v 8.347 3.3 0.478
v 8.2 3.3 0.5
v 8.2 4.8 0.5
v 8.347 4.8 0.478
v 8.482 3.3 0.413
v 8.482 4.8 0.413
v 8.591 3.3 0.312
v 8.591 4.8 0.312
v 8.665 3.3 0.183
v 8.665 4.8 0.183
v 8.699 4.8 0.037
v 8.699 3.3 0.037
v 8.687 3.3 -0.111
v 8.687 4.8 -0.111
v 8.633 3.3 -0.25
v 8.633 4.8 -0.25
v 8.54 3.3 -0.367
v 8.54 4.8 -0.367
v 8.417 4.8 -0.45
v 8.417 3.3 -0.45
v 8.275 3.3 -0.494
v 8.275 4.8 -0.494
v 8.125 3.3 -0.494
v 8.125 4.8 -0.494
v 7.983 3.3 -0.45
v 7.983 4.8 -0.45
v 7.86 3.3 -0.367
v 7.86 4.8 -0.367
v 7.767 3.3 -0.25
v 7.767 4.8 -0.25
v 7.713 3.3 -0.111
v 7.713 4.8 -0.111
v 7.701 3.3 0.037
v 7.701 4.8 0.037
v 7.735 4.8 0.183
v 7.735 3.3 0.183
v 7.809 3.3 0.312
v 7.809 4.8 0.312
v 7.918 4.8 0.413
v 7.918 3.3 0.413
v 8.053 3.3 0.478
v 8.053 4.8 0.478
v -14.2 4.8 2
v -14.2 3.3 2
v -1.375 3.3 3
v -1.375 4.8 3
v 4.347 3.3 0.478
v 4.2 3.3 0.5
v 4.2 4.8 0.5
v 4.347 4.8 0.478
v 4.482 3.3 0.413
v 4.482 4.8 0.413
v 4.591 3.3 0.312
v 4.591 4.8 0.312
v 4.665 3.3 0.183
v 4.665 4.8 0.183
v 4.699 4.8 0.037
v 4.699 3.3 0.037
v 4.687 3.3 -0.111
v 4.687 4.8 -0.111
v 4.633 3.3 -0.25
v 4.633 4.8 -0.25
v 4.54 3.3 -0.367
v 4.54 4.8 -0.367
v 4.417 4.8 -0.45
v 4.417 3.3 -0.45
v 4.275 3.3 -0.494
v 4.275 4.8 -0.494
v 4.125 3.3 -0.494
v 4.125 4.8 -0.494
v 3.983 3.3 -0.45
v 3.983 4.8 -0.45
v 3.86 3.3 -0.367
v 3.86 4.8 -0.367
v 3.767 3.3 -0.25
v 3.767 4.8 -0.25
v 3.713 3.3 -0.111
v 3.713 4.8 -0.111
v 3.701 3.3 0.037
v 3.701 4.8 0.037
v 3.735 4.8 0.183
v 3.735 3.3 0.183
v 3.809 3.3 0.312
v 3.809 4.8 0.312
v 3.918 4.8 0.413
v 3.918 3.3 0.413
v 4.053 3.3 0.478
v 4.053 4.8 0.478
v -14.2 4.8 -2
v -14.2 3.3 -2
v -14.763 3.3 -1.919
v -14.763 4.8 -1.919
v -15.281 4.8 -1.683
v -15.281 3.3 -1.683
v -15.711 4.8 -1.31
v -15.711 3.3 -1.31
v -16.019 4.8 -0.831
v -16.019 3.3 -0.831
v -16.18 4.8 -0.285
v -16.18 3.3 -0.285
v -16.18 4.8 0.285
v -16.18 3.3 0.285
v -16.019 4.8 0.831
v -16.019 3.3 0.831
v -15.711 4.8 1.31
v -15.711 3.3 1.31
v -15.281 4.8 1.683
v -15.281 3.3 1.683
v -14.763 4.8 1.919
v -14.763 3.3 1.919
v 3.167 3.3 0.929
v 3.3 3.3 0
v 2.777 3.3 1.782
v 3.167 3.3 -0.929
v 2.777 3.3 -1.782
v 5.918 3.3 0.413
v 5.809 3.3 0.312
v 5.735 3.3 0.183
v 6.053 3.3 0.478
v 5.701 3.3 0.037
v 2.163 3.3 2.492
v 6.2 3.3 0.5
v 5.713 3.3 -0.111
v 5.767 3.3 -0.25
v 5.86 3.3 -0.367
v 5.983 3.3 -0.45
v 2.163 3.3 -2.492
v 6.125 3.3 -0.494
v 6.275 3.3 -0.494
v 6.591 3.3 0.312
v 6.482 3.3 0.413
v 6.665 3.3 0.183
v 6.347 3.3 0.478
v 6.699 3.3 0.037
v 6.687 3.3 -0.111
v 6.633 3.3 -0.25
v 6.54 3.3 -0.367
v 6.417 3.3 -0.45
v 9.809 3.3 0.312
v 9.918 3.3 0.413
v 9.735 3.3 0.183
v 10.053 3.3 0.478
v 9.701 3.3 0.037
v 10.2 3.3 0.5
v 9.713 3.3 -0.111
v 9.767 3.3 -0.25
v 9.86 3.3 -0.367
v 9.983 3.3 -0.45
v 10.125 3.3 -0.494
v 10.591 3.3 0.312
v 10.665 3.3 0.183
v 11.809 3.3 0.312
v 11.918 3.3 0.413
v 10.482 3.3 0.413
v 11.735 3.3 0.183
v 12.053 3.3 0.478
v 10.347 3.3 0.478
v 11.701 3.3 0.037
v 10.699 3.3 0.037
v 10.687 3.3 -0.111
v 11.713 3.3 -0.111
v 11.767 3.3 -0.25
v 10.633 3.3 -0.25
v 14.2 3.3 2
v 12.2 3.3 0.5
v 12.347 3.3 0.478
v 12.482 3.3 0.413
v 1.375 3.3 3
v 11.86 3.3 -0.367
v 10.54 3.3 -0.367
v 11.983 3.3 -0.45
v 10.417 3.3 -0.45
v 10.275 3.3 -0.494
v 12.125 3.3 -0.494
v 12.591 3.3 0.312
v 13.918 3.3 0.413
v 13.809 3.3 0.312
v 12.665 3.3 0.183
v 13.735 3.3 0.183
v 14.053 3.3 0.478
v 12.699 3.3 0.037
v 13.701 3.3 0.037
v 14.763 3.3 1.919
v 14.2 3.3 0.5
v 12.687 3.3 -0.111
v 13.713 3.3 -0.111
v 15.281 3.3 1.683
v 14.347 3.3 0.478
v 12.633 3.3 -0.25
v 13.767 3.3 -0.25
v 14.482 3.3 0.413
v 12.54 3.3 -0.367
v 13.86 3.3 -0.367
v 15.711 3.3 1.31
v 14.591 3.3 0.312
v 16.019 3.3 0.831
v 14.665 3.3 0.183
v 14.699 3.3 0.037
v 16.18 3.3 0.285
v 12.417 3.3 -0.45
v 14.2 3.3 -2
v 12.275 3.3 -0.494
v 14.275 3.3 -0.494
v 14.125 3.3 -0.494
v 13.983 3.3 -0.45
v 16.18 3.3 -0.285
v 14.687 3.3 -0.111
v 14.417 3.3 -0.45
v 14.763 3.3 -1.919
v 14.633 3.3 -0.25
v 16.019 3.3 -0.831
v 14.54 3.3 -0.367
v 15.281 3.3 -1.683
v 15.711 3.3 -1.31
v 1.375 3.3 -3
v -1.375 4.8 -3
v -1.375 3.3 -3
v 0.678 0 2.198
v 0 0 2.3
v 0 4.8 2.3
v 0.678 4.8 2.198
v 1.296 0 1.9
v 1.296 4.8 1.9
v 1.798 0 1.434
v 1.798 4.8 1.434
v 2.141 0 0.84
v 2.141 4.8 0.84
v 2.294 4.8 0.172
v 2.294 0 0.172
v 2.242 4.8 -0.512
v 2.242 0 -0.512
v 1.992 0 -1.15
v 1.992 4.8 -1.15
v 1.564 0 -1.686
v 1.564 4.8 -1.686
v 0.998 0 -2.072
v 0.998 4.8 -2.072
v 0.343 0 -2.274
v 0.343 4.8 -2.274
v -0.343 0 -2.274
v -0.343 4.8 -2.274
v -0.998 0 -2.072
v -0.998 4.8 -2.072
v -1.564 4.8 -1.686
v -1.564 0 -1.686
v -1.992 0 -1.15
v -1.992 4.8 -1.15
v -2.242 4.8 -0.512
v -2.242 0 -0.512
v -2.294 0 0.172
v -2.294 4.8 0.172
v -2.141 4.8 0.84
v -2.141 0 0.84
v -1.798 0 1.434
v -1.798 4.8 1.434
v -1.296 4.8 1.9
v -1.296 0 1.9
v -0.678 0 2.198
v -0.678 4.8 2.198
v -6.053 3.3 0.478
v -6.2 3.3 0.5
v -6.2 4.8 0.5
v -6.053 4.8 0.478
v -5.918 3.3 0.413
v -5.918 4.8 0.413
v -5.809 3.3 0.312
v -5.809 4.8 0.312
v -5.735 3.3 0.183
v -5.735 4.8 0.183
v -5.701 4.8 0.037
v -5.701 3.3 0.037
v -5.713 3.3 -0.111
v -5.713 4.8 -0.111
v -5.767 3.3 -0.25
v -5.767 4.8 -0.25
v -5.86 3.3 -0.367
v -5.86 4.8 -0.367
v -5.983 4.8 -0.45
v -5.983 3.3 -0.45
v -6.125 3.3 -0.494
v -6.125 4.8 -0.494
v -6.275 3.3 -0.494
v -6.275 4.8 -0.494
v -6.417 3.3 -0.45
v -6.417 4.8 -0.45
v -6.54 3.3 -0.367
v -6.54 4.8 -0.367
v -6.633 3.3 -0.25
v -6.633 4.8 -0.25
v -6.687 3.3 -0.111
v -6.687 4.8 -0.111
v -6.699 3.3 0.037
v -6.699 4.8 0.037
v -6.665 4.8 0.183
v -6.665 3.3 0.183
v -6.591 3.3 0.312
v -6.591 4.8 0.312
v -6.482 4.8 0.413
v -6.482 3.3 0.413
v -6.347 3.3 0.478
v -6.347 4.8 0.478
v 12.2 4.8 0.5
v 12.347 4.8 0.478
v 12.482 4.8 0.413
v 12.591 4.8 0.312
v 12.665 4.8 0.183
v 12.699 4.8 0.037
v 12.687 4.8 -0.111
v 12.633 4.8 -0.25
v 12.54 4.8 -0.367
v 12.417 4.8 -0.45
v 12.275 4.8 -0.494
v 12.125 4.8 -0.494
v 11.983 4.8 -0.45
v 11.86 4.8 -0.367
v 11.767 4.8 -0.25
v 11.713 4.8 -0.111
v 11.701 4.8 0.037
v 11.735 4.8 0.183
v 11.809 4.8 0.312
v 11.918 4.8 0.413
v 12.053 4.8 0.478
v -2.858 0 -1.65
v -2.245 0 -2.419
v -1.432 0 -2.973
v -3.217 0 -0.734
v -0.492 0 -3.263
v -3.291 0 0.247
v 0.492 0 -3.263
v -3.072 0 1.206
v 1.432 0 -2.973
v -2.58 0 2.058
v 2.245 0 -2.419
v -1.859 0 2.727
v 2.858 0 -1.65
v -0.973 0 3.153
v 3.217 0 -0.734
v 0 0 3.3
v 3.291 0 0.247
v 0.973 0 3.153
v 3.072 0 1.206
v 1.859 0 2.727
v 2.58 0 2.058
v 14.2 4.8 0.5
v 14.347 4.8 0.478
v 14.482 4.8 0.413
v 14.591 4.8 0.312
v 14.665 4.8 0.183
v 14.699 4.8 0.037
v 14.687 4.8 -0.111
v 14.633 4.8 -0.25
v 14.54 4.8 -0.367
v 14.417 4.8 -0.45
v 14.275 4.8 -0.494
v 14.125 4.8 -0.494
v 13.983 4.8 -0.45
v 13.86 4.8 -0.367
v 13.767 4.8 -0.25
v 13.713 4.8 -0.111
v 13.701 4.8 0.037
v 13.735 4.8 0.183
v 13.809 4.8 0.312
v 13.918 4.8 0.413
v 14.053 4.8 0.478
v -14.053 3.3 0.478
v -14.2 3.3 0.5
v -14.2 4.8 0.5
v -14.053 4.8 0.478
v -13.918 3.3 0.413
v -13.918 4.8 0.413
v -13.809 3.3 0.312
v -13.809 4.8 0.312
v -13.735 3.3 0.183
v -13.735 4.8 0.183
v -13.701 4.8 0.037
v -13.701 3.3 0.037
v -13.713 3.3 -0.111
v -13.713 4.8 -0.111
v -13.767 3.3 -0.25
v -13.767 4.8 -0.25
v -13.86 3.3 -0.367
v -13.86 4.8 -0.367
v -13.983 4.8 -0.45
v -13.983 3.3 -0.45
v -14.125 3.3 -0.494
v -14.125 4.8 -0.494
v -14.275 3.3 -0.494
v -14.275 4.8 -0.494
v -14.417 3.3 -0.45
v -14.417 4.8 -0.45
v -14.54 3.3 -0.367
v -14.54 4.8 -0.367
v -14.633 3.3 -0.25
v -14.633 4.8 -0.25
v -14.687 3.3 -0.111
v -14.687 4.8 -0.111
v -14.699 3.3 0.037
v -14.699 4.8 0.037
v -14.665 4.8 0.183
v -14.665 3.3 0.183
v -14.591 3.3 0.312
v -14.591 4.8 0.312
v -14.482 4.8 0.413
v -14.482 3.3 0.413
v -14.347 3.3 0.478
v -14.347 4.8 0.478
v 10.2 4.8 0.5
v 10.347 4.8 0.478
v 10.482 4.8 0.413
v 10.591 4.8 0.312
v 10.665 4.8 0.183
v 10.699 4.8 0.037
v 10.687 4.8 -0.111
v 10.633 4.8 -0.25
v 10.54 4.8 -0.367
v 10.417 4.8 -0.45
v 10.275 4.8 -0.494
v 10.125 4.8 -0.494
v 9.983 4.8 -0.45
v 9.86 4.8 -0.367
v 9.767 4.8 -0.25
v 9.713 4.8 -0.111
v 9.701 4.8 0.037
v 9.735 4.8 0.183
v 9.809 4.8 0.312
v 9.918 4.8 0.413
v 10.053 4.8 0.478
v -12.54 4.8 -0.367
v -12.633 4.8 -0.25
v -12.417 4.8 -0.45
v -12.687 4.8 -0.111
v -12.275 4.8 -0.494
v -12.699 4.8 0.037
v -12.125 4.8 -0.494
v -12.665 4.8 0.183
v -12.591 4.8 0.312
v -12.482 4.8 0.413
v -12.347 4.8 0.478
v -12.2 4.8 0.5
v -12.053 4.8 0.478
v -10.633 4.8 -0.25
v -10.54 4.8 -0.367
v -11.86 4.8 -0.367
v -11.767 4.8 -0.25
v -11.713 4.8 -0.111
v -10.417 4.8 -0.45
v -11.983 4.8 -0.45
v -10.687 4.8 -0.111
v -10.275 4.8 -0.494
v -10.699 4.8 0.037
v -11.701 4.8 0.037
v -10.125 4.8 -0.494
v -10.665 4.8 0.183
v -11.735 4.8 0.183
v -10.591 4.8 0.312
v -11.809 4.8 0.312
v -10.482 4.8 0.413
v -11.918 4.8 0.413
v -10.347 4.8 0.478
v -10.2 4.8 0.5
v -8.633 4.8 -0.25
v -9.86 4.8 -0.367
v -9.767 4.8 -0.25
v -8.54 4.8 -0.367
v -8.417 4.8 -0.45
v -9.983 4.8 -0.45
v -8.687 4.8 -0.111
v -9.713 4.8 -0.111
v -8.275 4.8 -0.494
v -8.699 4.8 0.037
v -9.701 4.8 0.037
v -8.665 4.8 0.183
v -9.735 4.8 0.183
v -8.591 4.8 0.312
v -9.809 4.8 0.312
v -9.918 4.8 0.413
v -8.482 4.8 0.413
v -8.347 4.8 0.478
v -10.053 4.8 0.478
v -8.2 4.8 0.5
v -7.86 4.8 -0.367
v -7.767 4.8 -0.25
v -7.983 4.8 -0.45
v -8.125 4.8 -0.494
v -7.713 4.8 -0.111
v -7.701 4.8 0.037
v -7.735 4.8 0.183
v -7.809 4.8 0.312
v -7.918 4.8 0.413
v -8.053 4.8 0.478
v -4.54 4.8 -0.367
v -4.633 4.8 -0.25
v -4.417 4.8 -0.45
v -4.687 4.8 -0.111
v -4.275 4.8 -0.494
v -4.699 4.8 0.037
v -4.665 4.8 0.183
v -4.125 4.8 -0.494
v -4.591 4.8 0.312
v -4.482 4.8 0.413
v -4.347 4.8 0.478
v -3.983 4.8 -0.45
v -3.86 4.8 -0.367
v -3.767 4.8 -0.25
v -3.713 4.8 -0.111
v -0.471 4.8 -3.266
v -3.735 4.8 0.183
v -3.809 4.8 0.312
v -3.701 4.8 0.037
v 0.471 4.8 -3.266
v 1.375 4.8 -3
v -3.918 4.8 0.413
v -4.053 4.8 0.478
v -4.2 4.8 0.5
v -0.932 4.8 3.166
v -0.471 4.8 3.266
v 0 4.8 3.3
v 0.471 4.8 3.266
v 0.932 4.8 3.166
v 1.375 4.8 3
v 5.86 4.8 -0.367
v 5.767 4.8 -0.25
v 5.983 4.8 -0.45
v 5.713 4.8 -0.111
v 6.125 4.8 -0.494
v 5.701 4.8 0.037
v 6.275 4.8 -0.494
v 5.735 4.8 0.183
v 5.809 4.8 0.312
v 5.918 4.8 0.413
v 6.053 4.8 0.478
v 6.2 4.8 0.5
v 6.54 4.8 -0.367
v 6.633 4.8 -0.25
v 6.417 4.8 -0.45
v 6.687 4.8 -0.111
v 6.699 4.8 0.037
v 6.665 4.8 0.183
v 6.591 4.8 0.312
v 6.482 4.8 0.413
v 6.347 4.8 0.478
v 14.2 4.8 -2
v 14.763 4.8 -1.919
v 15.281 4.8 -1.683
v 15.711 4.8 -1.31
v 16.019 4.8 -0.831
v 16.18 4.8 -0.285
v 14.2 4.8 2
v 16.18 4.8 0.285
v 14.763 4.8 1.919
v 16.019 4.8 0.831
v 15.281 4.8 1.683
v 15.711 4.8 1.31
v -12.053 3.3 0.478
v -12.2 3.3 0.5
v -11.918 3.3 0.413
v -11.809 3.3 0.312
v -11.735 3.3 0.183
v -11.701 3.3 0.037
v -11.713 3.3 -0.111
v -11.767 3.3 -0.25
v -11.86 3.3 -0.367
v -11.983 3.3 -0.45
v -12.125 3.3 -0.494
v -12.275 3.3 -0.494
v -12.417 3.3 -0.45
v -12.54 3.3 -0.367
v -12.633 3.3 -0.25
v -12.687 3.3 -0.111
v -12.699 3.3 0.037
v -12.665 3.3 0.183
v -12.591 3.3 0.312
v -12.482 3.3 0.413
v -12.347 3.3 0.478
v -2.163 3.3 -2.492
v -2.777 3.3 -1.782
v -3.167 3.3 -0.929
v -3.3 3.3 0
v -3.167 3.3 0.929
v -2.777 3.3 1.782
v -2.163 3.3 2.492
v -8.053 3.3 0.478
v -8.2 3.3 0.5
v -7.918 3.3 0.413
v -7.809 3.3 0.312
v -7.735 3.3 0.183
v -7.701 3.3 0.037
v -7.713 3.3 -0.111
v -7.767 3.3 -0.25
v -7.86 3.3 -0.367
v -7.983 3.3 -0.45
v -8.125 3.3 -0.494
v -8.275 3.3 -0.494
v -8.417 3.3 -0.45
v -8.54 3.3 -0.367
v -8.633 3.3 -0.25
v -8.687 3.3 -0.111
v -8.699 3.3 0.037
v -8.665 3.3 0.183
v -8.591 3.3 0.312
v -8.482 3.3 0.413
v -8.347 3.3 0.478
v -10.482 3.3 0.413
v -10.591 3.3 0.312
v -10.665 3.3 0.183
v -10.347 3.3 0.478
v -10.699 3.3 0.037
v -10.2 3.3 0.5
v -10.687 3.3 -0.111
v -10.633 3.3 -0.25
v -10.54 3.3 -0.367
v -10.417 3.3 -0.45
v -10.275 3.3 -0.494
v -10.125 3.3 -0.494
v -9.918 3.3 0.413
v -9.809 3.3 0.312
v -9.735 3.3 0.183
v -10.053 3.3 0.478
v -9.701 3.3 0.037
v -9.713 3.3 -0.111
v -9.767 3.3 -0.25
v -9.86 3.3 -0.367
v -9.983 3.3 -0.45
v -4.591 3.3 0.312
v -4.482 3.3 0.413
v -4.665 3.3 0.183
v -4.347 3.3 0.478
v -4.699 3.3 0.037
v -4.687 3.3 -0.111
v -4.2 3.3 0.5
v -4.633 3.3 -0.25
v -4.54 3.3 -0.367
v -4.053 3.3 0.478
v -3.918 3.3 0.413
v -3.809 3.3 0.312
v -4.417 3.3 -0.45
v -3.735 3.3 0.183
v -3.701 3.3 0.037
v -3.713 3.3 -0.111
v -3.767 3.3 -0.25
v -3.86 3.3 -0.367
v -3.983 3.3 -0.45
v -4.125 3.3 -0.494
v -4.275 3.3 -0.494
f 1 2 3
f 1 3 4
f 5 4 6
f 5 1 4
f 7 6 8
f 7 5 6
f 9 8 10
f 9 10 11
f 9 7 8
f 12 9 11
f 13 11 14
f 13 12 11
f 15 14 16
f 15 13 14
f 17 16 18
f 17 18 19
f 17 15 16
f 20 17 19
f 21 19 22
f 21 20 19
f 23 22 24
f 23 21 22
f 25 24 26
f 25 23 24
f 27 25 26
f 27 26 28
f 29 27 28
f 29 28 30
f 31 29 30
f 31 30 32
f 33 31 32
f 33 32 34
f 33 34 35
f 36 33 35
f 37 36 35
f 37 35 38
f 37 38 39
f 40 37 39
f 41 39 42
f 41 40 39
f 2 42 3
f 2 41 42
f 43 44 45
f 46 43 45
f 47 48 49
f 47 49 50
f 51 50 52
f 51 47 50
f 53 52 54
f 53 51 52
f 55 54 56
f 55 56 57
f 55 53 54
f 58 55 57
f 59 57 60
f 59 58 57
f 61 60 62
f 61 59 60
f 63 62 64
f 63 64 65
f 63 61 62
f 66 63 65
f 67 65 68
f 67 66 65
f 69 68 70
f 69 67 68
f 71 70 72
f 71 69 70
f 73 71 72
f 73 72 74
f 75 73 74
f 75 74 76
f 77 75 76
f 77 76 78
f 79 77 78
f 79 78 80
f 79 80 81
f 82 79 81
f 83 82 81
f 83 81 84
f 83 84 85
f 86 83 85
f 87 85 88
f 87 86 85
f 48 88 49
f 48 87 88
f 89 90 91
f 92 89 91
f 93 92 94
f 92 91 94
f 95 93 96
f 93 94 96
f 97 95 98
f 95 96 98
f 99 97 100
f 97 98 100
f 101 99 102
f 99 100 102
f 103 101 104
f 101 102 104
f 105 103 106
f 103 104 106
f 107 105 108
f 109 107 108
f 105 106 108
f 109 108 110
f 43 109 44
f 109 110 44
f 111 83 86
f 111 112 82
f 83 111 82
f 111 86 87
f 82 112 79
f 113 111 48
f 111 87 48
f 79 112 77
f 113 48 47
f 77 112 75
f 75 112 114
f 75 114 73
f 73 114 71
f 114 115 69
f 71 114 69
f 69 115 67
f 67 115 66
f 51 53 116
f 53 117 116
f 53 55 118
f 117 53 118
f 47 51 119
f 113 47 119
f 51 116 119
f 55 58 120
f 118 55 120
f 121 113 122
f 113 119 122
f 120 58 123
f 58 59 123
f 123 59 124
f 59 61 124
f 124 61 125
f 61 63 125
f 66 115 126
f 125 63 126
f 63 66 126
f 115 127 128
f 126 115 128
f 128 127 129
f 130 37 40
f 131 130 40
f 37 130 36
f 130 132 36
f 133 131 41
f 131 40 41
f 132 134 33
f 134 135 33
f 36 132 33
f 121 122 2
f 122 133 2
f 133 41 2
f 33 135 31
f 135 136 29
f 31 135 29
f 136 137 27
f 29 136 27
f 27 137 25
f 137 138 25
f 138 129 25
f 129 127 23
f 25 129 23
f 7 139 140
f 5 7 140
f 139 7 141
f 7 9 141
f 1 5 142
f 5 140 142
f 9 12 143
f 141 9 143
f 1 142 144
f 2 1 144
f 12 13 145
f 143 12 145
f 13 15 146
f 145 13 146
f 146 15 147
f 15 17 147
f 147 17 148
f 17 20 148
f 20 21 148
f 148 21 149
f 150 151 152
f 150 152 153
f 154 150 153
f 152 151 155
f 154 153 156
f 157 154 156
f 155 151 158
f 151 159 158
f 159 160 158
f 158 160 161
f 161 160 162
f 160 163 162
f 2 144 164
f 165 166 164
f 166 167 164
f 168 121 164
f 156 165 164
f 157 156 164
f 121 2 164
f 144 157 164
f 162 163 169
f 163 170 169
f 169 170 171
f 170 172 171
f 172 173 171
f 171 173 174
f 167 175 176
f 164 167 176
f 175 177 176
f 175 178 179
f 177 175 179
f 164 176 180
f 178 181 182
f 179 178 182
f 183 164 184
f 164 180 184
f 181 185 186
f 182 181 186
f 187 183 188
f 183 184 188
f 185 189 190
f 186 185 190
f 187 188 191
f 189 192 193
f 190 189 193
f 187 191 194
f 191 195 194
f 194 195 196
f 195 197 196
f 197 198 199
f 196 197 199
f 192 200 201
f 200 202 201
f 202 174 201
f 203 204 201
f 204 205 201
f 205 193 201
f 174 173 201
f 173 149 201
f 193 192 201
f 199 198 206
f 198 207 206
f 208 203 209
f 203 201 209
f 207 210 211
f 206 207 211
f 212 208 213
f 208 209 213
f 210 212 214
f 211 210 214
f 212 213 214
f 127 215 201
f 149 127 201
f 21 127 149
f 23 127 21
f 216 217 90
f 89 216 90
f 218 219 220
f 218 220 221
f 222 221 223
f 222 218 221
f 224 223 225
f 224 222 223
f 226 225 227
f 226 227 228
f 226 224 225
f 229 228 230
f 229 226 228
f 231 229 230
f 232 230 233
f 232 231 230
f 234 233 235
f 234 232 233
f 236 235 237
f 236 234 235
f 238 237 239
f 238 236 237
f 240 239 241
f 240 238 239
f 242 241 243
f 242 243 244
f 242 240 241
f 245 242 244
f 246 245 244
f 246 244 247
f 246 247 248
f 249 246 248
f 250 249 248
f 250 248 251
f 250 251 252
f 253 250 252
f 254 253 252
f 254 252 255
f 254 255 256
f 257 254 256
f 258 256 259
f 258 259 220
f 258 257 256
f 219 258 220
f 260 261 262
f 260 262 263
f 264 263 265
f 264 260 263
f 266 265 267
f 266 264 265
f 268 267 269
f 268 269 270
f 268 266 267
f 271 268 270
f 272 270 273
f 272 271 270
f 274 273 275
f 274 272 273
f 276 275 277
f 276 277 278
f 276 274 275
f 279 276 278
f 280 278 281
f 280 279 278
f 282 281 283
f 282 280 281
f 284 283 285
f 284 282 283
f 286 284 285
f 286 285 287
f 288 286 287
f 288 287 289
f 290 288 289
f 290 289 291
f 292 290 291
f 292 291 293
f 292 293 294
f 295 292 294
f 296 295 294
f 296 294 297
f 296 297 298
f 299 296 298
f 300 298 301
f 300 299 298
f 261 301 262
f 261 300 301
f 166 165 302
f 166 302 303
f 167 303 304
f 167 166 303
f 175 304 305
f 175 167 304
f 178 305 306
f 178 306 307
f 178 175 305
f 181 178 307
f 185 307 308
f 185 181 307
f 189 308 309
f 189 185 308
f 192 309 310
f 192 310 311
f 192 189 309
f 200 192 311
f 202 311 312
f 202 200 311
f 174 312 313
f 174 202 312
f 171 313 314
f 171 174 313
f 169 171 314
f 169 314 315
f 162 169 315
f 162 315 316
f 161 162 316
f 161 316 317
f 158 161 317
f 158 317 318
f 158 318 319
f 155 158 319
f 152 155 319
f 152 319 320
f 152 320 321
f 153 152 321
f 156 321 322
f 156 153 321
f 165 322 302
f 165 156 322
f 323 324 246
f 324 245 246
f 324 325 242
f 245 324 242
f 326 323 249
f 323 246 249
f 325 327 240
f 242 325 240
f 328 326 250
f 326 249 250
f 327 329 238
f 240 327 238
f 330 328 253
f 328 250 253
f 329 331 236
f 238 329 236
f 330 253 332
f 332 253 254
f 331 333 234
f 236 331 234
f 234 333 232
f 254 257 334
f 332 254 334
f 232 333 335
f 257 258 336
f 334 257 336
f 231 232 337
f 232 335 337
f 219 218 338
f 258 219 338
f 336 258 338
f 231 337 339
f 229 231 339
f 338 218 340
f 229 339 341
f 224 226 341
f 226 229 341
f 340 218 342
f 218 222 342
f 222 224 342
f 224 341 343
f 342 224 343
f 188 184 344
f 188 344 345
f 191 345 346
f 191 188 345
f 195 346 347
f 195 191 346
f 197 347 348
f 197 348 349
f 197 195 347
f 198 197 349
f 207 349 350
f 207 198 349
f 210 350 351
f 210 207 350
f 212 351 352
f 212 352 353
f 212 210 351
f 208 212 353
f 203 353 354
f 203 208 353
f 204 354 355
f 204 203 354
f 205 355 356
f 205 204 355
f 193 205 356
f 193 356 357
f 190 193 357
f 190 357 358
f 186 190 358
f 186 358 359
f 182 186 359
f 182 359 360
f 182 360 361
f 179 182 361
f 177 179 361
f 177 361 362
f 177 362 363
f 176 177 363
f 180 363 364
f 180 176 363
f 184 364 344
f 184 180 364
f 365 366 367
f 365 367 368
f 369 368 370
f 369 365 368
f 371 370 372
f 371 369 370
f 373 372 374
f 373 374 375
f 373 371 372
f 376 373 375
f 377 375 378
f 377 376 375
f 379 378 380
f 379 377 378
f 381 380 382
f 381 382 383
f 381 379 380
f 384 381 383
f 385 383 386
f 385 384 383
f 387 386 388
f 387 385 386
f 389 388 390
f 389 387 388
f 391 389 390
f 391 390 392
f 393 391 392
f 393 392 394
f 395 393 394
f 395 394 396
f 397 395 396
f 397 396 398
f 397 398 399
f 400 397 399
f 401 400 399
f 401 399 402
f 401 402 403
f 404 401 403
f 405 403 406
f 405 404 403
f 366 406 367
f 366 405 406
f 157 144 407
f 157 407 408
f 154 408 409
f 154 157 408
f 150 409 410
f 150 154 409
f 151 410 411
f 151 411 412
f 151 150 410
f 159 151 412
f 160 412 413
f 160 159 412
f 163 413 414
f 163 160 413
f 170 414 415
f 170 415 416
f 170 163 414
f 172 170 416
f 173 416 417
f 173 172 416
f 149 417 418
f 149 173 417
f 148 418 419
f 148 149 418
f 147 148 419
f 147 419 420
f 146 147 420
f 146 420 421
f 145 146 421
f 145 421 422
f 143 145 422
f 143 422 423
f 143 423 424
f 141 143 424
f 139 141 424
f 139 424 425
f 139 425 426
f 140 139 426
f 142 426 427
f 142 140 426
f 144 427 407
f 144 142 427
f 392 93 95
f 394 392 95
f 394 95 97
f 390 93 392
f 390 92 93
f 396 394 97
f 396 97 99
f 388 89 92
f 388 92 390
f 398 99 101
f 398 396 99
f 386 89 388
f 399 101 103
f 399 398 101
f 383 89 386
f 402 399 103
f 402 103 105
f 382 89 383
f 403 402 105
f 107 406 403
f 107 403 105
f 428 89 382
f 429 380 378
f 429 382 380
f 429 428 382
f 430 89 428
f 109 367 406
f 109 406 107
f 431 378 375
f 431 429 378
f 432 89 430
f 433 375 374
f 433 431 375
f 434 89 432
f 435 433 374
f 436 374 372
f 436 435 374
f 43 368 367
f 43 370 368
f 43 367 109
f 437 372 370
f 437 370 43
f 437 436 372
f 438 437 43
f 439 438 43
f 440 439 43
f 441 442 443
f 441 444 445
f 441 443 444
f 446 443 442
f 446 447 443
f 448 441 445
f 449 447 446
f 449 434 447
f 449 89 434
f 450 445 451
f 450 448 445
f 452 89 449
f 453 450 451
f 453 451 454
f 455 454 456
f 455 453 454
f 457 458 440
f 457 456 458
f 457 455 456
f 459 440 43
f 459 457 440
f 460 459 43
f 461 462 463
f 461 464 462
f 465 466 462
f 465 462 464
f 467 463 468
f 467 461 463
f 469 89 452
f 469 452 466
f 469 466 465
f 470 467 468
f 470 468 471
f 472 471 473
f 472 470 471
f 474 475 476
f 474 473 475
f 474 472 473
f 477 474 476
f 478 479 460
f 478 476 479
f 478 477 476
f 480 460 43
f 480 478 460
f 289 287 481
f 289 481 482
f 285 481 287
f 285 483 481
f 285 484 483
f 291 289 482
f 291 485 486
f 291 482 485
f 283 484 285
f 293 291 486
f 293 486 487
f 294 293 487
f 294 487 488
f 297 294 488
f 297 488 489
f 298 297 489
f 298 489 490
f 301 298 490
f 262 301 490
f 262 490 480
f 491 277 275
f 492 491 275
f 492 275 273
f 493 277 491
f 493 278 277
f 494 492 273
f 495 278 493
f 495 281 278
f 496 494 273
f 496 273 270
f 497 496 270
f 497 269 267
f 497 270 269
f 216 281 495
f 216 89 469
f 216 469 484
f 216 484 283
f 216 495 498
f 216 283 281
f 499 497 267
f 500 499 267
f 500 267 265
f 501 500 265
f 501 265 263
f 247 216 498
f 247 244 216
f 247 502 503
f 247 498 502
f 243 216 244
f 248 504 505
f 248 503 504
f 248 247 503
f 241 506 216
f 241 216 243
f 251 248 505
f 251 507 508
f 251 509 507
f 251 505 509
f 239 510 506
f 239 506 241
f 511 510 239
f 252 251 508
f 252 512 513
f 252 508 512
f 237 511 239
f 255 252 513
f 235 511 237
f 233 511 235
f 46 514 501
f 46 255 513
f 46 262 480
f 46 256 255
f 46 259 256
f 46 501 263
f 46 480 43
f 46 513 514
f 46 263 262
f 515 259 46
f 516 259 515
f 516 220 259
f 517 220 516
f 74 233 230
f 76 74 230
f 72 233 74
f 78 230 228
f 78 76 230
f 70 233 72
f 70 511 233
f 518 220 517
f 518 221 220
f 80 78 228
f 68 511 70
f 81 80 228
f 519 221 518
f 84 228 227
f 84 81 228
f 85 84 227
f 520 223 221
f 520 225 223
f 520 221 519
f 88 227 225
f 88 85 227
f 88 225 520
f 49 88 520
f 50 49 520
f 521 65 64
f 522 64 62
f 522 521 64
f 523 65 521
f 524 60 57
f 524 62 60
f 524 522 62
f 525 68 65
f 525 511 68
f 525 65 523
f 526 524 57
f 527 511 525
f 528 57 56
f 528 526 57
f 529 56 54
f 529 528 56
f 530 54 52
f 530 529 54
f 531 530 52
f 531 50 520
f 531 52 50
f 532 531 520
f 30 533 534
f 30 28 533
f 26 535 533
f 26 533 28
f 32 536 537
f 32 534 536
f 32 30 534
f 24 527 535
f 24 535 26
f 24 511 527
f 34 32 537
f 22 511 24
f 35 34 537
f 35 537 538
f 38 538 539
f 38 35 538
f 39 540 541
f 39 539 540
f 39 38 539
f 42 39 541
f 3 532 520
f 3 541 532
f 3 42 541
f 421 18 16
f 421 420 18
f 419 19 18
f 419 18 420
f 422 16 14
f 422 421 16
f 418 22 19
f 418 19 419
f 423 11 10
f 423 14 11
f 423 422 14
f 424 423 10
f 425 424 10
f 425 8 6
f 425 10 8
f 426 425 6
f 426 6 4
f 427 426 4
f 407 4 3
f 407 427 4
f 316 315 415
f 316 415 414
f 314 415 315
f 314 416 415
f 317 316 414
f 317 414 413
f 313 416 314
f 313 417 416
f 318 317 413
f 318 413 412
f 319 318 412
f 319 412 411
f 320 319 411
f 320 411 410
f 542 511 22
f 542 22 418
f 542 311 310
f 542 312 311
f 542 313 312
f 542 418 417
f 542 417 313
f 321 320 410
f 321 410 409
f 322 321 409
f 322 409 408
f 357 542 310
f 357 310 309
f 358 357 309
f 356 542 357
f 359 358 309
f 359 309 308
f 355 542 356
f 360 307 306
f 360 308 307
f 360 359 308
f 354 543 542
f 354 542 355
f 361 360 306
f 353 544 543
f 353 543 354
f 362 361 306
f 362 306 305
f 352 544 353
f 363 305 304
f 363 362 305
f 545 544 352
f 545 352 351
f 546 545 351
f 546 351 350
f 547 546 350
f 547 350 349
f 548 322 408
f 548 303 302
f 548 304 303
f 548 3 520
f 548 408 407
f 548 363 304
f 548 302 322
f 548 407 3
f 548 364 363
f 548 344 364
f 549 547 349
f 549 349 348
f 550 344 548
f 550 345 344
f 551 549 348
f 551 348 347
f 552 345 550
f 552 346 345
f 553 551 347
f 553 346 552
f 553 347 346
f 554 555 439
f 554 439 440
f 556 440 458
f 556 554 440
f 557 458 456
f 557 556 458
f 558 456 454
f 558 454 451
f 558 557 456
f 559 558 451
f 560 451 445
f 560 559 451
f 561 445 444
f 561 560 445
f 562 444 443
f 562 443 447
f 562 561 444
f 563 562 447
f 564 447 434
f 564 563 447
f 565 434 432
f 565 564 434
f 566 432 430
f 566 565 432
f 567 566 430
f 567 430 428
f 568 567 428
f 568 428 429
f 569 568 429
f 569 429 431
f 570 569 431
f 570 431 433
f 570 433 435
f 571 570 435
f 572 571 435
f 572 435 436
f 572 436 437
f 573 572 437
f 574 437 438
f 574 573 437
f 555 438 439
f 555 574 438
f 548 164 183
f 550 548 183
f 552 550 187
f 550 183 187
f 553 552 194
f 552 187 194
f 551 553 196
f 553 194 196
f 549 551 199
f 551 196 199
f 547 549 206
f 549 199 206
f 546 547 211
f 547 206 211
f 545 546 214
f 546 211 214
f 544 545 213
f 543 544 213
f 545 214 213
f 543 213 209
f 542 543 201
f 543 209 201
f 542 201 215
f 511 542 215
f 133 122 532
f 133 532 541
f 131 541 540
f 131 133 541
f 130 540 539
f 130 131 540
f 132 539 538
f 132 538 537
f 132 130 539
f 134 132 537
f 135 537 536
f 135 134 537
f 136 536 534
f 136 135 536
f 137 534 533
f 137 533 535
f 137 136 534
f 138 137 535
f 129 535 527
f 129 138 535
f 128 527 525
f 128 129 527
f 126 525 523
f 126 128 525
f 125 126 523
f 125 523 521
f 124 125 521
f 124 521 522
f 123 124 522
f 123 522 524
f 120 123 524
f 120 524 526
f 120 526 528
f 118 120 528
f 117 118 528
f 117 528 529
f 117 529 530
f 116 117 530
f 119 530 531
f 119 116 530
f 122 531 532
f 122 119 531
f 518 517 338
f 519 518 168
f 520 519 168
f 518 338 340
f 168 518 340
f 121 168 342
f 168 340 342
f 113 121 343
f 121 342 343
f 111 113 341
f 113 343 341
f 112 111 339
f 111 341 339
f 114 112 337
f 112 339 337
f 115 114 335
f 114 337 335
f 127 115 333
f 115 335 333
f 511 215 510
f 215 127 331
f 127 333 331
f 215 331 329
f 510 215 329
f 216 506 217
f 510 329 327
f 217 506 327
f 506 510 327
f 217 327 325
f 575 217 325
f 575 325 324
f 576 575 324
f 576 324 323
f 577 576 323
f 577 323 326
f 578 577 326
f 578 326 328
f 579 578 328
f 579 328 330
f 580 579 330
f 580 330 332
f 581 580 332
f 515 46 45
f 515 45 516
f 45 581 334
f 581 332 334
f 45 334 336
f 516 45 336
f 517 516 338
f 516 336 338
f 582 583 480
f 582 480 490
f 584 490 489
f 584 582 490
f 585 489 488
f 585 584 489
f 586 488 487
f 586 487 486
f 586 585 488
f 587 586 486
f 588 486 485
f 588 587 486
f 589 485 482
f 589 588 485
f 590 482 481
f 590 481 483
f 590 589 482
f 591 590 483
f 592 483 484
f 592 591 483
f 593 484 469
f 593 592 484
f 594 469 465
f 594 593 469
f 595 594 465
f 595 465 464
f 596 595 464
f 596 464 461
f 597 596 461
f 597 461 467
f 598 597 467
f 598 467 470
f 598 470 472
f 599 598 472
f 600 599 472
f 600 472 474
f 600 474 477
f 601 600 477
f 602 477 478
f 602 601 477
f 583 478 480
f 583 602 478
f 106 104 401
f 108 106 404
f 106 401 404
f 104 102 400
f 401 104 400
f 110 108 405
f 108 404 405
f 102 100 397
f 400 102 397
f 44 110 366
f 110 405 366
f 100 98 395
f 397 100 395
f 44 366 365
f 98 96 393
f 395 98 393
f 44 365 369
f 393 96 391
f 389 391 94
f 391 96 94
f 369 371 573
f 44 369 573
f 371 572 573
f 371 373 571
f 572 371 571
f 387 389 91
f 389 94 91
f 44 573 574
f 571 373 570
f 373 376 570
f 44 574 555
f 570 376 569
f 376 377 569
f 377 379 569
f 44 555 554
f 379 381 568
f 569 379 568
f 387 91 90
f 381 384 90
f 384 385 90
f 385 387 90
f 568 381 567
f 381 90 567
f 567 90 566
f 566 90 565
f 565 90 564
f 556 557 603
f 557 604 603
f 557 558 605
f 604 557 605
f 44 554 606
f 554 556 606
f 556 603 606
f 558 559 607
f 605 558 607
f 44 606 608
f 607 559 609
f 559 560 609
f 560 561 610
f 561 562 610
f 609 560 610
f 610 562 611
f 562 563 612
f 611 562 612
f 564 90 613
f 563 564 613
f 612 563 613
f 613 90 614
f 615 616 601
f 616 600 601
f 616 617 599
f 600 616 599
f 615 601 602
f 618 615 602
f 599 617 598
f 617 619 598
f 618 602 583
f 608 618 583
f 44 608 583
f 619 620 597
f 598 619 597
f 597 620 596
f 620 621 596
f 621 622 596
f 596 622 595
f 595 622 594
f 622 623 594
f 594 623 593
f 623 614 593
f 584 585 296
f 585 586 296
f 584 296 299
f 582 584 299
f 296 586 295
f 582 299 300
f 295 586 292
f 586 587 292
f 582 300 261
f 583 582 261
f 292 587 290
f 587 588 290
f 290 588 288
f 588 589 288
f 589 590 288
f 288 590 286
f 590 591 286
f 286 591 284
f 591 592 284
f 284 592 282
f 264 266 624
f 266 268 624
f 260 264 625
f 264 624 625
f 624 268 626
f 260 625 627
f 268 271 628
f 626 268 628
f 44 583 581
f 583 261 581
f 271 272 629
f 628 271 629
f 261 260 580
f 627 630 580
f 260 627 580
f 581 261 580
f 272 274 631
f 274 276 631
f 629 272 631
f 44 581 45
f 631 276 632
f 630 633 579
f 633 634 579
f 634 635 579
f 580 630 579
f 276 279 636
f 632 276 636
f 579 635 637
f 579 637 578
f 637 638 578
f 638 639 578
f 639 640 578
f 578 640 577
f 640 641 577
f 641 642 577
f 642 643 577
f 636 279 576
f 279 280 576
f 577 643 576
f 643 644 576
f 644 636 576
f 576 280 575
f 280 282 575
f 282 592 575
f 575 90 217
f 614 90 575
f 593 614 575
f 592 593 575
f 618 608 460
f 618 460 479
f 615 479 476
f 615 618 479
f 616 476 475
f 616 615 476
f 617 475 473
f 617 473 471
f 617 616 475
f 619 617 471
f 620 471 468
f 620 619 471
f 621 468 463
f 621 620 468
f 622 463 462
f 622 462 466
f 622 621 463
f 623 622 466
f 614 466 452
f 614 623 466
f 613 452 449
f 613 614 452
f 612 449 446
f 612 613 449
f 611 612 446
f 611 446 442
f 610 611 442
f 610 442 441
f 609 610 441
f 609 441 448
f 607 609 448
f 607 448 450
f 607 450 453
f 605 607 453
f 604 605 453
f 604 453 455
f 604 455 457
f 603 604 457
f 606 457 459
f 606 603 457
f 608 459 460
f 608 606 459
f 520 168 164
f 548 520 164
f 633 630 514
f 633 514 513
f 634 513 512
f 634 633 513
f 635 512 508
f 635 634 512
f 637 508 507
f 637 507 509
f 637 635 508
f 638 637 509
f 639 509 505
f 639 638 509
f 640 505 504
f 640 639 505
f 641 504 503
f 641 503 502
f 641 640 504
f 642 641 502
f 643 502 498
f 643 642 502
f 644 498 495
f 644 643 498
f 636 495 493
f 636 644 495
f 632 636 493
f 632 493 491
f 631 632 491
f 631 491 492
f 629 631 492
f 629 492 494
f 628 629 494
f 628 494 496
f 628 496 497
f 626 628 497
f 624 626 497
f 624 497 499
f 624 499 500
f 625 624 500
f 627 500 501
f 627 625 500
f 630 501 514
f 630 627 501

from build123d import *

# Parameters (mm, degrees)
ESBO_O2_R                = 3.3
ESBO_O2_R_2              = 2.3
RESSALTO_EXTRUS_O1_DEPTH = 4.8
RESSALTO_EXTRUS_O2_START = -1.5
ESBO_O3_R                = 0.5
RESSALTO_EXTRUS_O2_DEPTH = 1.5


with BuildPart() as part:
    # Esboço2 → Ressalto-extrusão1 (new body)
    with BuildSketch(Plane(origin=(0, 0, 0), x_dir=(1, 0, 0), z_dir=(0, 1, 0))):
        with Locations(Location((0, 0, 0), (0, 0, 270))):
            Circle(ESBO_O2_R)
        with Locations(Location((0, 0, 0), (0, 0, 270))):
            Circle(ESBO_O2_R_2, mode=Mode.SUBTRACT)
    extrude(amount=RESSALTO_EXTRUS_O1_DEPTH)

    # Esboço3 → Ressalto-extrusão2 (add)
    # profile 1 of 2: a face of its own
    with BuildSketch(Plane(origin=(0, 4.8, 0), x_dir=(1, 0, 0), z_dir=(0, 1, 0)).offset(RESSALTO_EXTRUS_O2_START)):
        with BuildLine():
            Line((14.2, 2), (1.374772708, 3))
            ThreePointArc((1.374772708, 3), (2.777296342, 1.782308904), (3.3, 0))
            ThreePointArc((3.3, 0), (2.777296342, -1.782308904), (1.374772708, -3))
            Line((1.374772708, -3), (14.2, -2))
            ThreePointArc((14.2, -2), (16.2, 0), (14.2, 2))
        make_face()
        with Locations(Location((4.2, 0, 0), (0, 0, 270))):
            Circle(ESBO_O3_R, mode=Mode.SUBTRACT)
        with Locations(Location((6.2, 0, 0), (0, 0, 270))):
            Circle(ESBO_O3_R, mode=Mode.SUBTRACT)
        with Locations(Location((8.2, 0, 0), (0, 0, 270))):
            Circle(ESBO_O3_R, mode=Mode.SUBTRACT)
        with Locations(Location((10.2, 0, 0), (0, 0, 270))):
            Circle(ESBO_O3_R, mode=Mode.SUBTRACT)
        with Locations(Location((12.2, 0, 0), (0, 0, 270))):
            Circle(ESBO_O3_R, mode=Mode.SUBTRACT)
        with Locations(Location((14.2, 0, 0), (0, 0, 270))):
            Circle(ESBO_O3_R, mode=Mode.SUBTRACT)
    # profile 2 of 2: a face of its own
    with BuildSketch(Plane(origin=(0, 4.8, 0), x_dir=(1, 0, 0), z_dir=(0, 1, 0)).offset(RESSALTO_EXTRUS_O2_START)):
        with BuildLine():
            ThreePointArc((-1.374772708, -3), (-3.3, 0), (-1.374772708, 3))
            Line((-1.374772708, 3), (-14.2, 2))
            ThreePointArc((-14.2, 2), (-16.2, 0), (-14.2, -2))
            Line((-14.2, -2), (-1.374772708, -3))
        make_face()
        with Locations(Location((-14.2, 0, 0), (0, 0, 270))):
            Circle(ESBO_O3_R, mode=Mode.SUBTRACT)
        with Locations(Location((-12.2, 0, 0), (0, 0, 270))):
            Circle(ESBO_O3_R, mode=Mode.SUBTRACT)
        with Locations(Location((-10.2, 0, 0), (0, 0, 270))):
            Circle(ESBO_O3_R, mode=Mode.SUBTRACT)
        with Locations(Location((-8.2, 0, 0), (0, 0, 270))):
            Circle(ESBO_O3_R, mode=Mode.SUBTRACT)
        with Locations(Location((-6.2, 0, 0), (0, 0, 270))):
            Circle(ESBO_O3_R, mode=Mode.SUBTRACT)
        with Locations(Location((-4.2, 0, 0), (0, 0, 270))):
            Circle(ESBO_O3_R, mode=Mode.SUBTRACT)
    extrude(amount=RESSALTO_EXTRUS_O2_DEPTH)


solid = part.part
